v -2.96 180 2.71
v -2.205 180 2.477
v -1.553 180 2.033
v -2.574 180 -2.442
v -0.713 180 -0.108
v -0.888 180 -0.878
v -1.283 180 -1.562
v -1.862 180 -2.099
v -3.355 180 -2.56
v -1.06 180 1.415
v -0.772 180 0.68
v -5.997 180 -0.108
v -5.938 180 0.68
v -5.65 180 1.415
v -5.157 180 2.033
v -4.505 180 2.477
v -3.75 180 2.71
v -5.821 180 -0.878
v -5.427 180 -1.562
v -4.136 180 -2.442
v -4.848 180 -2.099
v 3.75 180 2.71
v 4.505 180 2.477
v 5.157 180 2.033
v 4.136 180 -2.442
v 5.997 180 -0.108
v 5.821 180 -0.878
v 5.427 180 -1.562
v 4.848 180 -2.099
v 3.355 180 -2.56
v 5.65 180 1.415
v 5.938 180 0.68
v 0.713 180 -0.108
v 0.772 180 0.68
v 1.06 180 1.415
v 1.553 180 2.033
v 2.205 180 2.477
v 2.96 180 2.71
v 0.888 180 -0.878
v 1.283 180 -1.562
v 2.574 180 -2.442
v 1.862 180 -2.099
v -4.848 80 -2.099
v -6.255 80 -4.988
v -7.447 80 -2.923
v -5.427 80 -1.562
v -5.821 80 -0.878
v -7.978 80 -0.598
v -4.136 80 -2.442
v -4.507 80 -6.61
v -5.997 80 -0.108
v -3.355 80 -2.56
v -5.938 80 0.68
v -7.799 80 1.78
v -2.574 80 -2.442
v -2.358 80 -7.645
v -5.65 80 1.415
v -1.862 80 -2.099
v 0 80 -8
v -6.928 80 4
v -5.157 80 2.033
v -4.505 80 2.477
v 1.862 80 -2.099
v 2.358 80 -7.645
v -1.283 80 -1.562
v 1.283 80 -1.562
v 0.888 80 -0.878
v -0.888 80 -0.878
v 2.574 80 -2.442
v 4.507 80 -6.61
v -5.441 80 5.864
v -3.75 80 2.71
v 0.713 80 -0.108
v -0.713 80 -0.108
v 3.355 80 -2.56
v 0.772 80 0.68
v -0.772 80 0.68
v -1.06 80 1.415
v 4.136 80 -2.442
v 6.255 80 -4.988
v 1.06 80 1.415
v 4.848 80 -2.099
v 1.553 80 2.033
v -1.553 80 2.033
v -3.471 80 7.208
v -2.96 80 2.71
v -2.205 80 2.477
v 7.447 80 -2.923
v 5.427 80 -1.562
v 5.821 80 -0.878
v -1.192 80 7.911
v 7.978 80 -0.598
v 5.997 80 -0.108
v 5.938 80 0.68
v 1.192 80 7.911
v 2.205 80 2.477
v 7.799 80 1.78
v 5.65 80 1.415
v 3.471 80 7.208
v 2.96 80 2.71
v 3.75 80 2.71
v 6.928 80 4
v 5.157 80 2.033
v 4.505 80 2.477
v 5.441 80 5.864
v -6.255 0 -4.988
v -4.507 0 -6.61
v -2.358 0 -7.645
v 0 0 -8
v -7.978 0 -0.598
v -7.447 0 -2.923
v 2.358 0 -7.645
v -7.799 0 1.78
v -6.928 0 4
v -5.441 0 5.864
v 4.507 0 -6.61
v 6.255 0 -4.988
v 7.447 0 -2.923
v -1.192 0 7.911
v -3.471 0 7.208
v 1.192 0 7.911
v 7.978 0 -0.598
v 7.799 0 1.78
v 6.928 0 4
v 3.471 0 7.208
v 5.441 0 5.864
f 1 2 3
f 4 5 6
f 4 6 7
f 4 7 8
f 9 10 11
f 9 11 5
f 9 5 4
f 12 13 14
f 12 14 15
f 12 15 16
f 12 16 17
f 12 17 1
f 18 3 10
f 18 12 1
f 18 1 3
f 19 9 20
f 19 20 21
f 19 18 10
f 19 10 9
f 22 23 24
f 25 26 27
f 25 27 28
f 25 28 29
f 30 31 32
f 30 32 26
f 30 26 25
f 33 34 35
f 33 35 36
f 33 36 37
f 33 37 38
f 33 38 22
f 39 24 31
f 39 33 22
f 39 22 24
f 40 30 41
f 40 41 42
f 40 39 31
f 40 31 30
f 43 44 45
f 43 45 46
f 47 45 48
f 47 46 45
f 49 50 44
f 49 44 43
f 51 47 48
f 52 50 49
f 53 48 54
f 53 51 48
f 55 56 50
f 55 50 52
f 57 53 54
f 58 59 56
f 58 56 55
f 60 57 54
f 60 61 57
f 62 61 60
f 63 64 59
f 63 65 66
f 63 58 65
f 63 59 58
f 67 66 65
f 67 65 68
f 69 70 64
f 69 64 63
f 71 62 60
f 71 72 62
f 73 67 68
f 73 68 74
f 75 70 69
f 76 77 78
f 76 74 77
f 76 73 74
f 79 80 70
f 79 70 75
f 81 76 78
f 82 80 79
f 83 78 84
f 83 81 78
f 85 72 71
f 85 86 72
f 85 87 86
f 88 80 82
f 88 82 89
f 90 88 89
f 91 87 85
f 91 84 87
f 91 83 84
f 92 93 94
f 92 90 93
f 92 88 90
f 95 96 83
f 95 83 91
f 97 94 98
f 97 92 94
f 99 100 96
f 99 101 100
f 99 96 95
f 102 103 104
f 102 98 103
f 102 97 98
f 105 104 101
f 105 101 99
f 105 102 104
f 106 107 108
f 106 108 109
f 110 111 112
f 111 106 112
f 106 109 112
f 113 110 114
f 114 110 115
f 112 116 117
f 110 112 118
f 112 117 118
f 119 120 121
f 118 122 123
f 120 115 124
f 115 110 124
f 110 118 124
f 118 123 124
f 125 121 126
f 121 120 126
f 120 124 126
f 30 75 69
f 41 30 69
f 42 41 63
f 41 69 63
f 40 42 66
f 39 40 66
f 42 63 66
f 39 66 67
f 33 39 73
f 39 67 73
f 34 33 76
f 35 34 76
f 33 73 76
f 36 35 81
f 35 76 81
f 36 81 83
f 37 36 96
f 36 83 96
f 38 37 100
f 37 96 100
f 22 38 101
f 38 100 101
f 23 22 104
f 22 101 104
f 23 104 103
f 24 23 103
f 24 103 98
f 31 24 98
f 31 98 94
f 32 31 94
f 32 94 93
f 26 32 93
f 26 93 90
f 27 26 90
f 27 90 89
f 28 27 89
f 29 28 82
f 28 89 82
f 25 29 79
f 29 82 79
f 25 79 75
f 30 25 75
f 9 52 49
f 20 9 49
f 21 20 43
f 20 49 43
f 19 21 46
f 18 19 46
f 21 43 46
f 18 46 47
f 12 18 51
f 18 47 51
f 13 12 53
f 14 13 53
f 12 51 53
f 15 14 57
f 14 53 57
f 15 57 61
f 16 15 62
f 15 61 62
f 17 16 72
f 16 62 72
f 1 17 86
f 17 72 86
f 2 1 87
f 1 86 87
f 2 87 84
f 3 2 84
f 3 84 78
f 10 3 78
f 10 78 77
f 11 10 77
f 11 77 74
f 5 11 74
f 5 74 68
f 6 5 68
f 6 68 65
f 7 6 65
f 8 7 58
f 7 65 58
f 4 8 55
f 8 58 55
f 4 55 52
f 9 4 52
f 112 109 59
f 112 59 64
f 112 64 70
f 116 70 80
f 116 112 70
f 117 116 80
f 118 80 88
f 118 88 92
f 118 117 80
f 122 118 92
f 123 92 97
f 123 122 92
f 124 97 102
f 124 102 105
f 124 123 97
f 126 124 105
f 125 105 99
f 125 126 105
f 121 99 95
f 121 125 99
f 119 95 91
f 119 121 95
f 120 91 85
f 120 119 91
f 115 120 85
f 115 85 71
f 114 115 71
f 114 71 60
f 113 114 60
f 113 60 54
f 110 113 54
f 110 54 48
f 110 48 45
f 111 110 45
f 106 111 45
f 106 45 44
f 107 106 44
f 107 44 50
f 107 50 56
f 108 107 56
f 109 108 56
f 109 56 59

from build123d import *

# Parameters (mm, degrees)
SKETCH_1_R          = 10.5
EXTRUDE_1_DEPTH     = 80
SKETCH_2_R          = 2.649752209
EXTRUDE_2_DEPTH     = 100
SKETCH_3_R          = 10.5
SKETCH_3_R_2        = 8
CUT_EXTRUDE_1_DEPTH = 181.61146143


with BuildPart() as part:
    # 草图1 → 凸台-拉伸1 (new body)
    with BuildSketch(Plane(origin=(0, 0, 0), x_dir=(1, 0, 0), z_dir=(0, 1, 0))):
        with Locations(Location((0, 0, 0), (0, 0, 270))):
            Circle(SKETCH_1_R)
    extrude(amount=EXTRUDE_1_DEPTH)

    # 草图2 → 凸台-拉伸2 (add)
    with BuildSketch(Plane(origin=(0, 80, 0), x_dir=(1, 0, 0), z_dir=(0, 1, 0))):
        with Locations(Location((-3.354877279, -0.090103274, 0), (0, 0, 90))):
            Circle(SKETCH_2_R)
        with Locations(Location((3.354877279, -0.090103274, 0), (0, 0, 90))):
            Circle(SKETCH_2_R)
    extrude(amount=EXTRUDE_2_DEPTH)

    # 草图3 → 切除-拉伸1 (cut, through all)
    with BuildSketch(Plane.XZ):
        Circle(SKETCH_3_R)
        with Locations(Location((0, 0, 0), (0, 0, 270))):
            Circle(SKETCH_3_R_2, mode=Mode.SUBTRACT)
    extrude(amount=-CUT_EXTRUDE_1_DEPTH, mode=Mode.SUBTRACT)


solid = part.part
